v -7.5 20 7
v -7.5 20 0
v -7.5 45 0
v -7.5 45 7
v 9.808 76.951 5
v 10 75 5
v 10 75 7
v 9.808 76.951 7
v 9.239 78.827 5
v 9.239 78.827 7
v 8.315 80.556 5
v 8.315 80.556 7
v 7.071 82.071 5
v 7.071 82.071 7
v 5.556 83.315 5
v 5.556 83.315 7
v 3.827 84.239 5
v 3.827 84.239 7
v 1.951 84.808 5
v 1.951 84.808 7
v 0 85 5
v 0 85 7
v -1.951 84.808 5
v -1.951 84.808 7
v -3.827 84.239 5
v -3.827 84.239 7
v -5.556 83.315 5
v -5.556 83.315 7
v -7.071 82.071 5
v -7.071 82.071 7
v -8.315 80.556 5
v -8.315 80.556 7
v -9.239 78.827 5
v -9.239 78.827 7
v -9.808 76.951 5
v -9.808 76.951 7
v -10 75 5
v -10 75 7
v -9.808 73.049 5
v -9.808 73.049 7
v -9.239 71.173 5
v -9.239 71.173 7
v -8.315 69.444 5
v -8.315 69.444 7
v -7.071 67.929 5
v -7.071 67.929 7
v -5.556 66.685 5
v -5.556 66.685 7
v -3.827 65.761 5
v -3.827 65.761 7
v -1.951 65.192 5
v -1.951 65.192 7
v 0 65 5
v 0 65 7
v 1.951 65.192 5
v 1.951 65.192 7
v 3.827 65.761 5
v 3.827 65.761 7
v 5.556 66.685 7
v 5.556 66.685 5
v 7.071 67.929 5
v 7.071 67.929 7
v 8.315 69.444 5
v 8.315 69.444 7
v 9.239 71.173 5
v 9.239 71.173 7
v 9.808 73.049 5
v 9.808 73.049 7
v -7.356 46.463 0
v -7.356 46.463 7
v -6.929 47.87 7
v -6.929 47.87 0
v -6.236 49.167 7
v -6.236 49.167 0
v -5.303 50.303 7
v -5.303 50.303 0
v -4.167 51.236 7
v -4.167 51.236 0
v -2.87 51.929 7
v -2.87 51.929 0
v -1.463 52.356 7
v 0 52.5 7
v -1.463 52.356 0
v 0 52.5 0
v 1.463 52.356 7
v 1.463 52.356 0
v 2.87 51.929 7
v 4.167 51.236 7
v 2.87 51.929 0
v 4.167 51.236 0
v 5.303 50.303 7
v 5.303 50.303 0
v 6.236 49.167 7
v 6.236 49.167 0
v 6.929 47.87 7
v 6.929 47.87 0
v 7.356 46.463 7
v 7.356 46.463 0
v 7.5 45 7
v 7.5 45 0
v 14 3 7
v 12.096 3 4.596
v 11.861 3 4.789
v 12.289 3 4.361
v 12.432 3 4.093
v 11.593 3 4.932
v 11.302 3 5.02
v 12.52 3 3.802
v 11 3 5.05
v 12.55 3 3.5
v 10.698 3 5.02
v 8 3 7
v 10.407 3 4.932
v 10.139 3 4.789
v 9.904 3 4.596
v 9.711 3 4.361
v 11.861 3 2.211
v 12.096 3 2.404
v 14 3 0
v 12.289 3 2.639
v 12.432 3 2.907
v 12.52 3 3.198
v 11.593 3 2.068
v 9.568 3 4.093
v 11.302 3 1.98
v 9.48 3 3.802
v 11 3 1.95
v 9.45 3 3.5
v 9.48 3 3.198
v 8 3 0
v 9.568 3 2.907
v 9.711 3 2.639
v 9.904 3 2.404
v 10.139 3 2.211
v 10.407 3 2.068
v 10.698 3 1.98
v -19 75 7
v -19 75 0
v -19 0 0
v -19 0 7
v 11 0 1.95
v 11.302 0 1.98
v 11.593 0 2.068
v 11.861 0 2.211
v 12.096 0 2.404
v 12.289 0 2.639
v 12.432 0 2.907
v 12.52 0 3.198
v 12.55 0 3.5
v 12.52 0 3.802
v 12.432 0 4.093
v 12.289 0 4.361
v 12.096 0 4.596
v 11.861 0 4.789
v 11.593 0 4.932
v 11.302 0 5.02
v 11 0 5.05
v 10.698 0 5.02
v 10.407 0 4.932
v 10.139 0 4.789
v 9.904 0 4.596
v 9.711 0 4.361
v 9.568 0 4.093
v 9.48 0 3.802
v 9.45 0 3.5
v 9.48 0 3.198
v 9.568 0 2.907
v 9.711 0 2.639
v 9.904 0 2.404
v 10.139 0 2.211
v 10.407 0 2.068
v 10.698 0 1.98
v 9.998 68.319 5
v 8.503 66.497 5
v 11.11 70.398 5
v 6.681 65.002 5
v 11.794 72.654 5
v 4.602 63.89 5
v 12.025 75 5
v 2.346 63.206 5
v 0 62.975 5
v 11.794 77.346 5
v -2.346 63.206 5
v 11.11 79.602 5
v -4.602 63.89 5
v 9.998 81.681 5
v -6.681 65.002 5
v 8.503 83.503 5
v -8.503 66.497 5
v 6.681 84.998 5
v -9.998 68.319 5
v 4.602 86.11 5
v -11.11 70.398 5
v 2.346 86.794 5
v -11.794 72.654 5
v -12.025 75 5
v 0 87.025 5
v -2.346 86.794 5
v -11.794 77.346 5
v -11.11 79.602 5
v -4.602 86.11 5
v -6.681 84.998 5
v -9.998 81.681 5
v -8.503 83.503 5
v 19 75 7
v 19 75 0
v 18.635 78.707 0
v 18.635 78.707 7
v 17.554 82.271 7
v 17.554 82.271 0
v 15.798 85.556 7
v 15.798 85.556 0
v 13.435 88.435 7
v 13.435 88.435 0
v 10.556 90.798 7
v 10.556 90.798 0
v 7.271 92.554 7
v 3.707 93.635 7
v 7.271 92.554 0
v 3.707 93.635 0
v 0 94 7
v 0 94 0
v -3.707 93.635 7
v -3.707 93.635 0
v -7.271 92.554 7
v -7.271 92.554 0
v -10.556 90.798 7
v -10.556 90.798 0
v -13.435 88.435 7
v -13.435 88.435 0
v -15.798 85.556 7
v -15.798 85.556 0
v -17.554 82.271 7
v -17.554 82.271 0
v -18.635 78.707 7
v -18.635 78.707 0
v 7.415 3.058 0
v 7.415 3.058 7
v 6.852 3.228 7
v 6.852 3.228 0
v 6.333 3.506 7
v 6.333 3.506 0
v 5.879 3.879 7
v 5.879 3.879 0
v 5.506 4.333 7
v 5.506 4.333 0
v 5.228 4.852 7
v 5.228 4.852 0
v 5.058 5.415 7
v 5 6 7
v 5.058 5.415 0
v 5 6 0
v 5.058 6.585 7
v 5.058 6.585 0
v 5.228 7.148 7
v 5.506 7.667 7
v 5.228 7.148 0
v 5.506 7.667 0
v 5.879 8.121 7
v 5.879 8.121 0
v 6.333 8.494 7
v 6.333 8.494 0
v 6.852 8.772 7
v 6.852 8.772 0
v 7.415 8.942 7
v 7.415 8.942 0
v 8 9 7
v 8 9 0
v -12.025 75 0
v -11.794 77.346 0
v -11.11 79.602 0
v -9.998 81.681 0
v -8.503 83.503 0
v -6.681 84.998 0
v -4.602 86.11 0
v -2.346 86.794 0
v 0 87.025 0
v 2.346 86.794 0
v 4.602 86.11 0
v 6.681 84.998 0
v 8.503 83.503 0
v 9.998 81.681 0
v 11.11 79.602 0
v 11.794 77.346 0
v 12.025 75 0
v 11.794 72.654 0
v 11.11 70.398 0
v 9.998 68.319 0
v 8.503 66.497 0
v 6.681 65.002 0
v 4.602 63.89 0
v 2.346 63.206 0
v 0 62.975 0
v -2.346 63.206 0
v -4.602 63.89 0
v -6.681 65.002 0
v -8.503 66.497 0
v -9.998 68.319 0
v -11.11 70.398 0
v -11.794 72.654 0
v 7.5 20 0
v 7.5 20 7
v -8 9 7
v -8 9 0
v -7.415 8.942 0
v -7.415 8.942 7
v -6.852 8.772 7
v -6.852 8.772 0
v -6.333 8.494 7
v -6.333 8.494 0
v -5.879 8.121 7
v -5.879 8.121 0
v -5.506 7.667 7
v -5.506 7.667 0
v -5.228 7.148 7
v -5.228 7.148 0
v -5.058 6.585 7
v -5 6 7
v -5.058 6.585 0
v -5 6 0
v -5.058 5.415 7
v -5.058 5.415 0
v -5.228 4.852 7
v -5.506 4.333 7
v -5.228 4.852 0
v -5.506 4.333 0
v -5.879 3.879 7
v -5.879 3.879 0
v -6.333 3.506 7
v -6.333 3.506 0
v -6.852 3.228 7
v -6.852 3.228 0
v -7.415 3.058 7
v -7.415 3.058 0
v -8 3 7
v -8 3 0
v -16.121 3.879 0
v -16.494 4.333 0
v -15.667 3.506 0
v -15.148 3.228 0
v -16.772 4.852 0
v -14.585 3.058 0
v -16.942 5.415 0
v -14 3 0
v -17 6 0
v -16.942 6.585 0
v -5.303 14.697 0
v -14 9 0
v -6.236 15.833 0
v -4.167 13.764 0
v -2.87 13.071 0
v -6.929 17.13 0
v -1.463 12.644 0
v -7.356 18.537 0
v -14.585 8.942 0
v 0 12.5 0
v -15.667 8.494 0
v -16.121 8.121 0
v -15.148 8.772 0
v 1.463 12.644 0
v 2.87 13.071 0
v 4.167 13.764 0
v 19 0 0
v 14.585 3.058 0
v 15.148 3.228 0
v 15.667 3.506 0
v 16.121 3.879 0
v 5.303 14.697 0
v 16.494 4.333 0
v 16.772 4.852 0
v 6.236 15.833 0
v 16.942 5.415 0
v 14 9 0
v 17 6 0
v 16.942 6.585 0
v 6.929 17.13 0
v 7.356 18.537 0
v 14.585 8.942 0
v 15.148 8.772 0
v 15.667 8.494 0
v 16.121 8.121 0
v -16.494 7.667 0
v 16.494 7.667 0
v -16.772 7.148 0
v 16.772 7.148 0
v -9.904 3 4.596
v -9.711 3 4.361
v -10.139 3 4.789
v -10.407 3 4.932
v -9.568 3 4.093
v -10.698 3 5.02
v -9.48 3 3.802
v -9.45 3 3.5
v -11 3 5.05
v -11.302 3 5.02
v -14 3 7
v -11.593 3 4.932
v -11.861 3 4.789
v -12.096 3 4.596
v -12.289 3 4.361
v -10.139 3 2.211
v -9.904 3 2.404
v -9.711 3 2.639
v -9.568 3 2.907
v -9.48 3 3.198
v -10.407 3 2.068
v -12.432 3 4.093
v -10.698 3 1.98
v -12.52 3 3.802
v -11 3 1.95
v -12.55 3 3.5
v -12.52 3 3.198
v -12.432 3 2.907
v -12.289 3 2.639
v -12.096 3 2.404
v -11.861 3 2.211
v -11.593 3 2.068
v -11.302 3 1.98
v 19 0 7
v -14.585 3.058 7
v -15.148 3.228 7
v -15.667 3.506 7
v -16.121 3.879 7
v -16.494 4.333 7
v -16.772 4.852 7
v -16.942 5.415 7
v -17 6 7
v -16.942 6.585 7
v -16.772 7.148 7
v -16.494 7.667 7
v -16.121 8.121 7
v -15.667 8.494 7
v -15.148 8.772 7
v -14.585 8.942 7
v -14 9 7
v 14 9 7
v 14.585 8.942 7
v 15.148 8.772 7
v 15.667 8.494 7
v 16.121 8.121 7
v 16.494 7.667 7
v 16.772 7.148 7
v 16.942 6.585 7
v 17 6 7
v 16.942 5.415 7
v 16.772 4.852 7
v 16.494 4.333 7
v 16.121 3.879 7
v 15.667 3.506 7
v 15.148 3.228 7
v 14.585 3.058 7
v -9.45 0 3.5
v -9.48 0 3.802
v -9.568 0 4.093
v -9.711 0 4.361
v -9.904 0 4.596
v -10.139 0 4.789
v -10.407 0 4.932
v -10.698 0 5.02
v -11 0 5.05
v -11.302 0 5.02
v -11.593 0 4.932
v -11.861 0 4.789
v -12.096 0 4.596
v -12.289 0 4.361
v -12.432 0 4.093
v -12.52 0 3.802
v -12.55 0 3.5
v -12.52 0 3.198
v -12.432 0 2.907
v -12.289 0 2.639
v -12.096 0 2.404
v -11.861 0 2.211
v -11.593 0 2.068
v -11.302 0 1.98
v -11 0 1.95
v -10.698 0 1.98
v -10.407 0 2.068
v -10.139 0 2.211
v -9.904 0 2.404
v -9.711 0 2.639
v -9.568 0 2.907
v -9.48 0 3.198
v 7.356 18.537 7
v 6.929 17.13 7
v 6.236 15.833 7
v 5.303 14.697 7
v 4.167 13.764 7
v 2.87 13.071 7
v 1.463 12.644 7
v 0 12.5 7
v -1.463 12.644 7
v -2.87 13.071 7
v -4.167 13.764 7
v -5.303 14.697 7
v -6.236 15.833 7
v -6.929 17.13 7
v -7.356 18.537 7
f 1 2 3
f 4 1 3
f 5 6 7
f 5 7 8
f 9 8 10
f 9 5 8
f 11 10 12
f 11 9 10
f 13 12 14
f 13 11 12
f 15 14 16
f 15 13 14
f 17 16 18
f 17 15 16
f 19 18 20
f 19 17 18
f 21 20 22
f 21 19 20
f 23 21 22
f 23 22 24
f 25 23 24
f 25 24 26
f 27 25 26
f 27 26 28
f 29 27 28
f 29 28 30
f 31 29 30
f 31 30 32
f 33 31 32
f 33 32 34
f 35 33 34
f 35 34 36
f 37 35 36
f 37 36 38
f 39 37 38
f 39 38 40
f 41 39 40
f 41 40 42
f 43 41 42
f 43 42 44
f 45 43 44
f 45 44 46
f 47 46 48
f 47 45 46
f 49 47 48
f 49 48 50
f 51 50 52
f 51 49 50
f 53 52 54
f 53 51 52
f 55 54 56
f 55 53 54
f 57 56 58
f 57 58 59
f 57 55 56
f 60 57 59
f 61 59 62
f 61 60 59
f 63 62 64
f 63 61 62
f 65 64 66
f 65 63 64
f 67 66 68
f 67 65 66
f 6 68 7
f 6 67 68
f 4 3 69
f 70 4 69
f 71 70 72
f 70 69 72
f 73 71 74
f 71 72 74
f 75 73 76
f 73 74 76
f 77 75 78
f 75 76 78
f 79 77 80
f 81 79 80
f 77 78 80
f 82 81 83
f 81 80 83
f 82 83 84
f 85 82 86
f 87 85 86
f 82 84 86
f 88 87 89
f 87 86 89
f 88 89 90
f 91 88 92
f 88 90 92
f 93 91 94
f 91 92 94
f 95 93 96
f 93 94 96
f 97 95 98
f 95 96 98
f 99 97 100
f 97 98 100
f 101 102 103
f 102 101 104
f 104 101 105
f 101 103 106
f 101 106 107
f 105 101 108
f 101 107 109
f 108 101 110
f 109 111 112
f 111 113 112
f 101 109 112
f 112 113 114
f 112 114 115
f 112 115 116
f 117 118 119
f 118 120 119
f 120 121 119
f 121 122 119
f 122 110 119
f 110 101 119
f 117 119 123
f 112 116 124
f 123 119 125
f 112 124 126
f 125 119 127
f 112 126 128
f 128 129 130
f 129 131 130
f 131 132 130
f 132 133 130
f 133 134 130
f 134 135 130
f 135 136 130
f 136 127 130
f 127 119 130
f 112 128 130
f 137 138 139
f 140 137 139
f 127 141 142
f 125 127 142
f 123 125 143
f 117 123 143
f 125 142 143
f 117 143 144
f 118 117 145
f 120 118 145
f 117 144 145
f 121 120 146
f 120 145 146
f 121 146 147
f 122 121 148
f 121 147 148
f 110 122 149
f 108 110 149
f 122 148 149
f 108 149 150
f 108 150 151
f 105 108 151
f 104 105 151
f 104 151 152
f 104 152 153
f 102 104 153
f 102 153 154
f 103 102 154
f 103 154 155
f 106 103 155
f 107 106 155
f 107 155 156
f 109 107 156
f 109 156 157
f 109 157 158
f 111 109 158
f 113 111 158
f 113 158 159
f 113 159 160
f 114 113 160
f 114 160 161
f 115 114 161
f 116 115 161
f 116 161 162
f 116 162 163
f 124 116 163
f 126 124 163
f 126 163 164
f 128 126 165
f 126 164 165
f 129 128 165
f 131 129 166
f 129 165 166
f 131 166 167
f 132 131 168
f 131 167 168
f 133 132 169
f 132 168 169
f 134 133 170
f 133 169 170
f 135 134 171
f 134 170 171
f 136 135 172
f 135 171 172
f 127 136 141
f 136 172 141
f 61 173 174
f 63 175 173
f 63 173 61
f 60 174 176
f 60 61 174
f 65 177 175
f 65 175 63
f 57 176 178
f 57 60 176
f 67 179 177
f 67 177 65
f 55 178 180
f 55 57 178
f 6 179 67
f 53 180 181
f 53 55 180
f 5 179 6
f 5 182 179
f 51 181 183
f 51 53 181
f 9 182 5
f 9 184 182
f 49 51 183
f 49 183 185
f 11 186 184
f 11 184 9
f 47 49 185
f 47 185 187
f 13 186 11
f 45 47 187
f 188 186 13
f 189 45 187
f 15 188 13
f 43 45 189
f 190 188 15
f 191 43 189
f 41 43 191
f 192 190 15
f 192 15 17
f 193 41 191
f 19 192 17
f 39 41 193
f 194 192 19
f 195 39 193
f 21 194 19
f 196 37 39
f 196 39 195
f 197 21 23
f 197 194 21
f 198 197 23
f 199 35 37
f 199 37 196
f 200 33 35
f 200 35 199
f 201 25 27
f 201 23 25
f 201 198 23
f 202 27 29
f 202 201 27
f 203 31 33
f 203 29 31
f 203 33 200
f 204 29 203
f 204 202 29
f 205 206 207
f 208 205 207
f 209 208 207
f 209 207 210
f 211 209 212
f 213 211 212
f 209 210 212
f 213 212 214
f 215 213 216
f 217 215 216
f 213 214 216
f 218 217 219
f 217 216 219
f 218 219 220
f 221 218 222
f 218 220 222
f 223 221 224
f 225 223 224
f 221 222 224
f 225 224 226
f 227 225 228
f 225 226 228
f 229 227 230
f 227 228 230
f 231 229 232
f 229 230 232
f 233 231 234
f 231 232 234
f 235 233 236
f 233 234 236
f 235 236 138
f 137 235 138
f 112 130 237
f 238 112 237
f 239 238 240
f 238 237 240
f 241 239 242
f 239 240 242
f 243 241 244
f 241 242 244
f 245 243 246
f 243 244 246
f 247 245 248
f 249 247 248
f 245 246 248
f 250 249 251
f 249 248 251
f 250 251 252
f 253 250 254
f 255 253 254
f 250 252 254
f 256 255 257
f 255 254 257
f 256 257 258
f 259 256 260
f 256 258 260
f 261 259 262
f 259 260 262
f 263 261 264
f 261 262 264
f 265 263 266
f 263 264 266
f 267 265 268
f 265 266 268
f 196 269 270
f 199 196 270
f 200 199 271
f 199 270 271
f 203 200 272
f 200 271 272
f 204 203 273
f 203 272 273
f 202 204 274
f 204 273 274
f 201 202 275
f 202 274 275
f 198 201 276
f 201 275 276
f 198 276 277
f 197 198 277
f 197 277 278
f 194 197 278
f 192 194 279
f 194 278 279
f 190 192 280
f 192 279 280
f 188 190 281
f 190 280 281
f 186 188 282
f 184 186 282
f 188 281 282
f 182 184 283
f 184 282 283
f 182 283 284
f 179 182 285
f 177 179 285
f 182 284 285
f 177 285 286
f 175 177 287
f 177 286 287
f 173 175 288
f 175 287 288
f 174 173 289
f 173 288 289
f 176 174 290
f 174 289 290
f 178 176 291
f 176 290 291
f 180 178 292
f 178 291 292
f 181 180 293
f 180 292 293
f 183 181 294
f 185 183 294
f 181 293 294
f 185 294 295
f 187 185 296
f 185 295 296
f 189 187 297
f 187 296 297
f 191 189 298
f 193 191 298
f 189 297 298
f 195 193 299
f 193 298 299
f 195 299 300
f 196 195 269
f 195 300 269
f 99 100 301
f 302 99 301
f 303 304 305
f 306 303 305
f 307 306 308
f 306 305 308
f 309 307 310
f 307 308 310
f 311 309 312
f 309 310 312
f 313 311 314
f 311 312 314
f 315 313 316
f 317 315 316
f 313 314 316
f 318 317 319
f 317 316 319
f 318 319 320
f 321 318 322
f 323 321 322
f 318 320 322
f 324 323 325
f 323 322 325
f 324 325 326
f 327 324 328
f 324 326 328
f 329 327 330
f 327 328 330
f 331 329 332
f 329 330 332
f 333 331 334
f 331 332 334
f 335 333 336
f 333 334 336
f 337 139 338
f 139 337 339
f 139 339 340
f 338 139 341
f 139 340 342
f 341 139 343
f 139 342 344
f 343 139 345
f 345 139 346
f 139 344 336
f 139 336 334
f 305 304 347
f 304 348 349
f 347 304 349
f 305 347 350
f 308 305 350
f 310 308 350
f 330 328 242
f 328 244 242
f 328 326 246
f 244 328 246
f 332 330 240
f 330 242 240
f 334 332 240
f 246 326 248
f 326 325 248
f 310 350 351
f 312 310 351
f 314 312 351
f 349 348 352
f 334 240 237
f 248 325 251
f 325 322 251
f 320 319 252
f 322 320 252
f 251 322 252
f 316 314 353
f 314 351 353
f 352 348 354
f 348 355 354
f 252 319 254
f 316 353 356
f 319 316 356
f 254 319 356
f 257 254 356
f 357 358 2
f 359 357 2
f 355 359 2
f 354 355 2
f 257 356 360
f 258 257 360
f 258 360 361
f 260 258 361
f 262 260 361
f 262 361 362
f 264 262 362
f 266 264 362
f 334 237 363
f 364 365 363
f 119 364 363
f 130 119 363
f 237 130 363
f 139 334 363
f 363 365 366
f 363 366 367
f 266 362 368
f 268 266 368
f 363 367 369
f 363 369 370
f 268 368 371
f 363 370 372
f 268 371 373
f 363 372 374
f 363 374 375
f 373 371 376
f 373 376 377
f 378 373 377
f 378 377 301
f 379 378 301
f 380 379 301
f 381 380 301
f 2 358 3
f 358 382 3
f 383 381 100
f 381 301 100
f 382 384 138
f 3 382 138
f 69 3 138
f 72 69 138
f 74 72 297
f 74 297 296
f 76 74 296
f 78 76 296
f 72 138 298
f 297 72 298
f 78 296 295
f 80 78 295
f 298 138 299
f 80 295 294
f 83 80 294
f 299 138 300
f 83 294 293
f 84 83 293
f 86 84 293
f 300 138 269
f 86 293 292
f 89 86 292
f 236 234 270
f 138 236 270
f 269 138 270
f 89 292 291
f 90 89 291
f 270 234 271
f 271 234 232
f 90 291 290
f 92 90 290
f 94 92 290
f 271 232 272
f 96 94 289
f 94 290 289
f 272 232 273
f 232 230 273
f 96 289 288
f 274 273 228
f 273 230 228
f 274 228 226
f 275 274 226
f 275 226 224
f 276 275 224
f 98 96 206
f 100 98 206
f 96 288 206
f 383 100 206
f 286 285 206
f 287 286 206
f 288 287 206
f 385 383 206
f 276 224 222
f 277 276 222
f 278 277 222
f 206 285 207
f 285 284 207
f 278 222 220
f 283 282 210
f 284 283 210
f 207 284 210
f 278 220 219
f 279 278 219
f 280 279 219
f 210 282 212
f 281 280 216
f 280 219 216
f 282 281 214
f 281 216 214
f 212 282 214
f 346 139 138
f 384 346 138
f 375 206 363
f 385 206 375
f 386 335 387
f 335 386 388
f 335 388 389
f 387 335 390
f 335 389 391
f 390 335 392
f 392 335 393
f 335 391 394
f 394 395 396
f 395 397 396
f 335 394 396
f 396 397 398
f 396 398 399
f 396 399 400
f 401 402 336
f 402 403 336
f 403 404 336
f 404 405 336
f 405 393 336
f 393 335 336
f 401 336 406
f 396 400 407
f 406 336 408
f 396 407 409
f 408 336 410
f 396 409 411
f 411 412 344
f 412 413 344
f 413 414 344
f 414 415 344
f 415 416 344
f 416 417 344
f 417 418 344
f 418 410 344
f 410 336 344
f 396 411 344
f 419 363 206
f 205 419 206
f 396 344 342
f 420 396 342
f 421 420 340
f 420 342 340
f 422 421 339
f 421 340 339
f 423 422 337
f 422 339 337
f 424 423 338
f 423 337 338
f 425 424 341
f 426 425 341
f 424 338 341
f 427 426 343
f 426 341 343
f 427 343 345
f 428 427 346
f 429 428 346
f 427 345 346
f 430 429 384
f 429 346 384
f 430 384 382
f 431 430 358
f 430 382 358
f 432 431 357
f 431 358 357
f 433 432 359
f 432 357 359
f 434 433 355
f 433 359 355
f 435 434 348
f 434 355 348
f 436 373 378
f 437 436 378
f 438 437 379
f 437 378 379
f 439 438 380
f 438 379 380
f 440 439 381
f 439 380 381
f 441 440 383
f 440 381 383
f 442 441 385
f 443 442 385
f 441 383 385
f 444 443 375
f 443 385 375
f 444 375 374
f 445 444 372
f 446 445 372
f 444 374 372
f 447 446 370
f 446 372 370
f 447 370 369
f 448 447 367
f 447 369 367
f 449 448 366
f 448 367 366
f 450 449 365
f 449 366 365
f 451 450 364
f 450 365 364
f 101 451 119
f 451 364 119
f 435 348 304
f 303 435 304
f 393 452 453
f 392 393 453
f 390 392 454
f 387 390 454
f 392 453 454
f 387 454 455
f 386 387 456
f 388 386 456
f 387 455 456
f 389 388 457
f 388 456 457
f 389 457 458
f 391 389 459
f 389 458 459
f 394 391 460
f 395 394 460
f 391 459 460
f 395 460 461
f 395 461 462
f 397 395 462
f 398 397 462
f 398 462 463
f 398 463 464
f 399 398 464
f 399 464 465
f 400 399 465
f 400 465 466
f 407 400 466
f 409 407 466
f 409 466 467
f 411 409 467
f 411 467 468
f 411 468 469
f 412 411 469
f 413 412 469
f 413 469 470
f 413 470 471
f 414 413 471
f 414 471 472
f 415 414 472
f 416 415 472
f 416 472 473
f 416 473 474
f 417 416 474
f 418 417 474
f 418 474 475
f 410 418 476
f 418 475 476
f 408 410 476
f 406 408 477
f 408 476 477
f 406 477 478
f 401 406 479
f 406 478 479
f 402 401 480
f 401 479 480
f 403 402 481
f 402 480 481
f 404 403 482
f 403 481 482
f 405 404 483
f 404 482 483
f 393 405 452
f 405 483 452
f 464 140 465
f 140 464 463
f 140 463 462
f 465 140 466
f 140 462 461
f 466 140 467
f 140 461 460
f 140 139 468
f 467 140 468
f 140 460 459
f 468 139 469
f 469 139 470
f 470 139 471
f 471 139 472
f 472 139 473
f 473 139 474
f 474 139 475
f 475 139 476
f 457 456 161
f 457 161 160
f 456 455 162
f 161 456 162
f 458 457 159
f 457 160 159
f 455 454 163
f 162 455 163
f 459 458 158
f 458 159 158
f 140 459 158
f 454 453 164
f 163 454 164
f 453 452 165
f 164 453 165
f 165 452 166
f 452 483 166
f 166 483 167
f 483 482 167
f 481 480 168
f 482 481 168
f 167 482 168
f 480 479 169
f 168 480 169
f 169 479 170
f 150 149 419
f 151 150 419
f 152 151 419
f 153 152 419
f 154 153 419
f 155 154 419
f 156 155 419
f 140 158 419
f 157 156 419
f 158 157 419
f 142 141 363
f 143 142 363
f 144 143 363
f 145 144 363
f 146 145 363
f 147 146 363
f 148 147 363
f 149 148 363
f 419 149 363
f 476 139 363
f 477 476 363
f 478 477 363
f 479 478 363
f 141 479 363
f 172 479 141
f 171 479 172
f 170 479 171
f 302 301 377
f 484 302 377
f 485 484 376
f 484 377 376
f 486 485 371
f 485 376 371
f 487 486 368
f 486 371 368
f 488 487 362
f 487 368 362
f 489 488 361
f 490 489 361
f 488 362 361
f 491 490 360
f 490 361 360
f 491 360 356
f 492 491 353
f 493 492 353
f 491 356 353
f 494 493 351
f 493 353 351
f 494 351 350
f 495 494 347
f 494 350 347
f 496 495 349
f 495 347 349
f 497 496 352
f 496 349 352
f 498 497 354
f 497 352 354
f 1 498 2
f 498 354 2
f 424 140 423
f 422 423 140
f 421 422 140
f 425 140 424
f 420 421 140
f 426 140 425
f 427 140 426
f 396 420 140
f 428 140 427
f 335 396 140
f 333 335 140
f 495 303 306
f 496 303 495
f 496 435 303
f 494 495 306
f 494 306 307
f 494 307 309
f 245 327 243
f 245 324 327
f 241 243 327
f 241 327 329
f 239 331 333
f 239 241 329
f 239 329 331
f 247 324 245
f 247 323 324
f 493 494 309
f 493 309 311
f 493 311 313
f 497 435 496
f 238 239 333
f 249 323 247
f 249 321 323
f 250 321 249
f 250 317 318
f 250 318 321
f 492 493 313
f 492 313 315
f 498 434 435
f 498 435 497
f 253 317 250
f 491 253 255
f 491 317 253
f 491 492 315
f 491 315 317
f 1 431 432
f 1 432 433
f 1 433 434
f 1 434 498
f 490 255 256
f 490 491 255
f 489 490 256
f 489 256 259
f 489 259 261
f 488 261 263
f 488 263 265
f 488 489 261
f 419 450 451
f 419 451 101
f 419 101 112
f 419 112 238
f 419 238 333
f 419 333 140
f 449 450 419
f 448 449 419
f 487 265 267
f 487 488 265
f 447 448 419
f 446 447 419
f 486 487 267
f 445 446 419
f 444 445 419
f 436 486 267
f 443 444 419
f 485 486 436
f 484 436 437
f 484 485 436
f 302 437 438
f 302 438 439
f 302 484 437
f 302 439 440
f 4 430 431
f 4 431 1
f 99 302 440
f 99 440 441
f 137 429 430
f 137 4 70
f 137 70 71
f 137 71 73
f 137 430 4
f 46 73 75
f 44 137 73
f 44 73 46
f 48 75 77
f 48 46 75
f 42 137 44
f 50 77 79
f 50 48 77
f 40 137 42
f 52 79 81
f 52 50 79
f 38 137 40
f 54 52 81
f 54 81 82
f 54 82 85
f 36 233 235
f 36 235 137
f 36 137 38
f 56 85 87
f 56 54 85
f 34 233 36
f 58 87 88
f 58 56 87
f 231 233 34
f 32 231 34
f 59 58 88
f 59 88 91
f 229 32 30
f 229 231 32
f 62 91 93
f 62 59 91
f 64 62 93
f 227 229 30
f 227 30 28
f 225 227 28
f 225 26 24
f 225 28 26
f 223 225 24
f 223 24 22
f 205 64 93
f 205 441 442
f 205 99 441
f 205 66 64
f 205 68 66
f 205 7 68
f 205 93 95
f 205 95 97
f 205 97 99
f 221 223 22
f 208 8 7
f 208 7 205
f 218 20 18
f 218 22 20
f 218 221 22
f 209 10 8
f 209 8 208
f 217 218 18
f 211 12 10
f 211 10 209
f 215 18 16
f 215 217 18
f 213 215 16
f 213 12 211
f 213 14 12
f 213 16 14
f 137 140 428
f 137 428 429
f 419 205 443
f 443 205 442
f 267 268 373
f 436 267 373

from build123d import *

# Parameters (mm, degrees)
SKETCH_1_R         = 10
SKETCH_1_R_2       = 19
EXTRUDE_1_DEPTH    = 7
SKETCH2_R          = 12.025
CUT_EXTRUDE2_DEPTH = 5
SKETCH3_R          = 1.55
CUT_EXTRUDE3_DEPTH = 5


with BuildPart() as part:
    # 草图1 → 凸台-拉伸1 (new body)
    # profile 1 of 3: a face of its own
    with BuildSketch(Plane.XY):
        with BuildLine():
            ThreePointArc((19, 75), (0, 94), (-19, 75))
            ThreePointArc((-19, 75), (0, 56), (19, 75))
        make_face()
        with Locations((0, 75)):
            Circle(SKETCH_1_R, mode=Mode.SUBTRACT)
    # profile 2 of 3: a face of its own
    with BuildSketch(Plane.XY):
        with BuildLine():
            Line((-19, 7), (-19, 0))
            Line((-19, 0), (19, 0))
            Line((19, 0), (19, 7))
            Line((19, 7), (19, 75))
            ThreePointArc((19, 75), (0, 56), (-19, 75))
            Line((-19, 75), (-19, 7))
        make_face()
        with BuildLine():
            ThreePointArc((-8, 9), (-5, 6), (-8, 3))
            Line((-8, 3), (-14, 3))
            ThreePointArc((-14, 3), (-17, 6), (-14, 9))
            Line((-14, 9), (-8, 9))
        make_face(mode=Mode.SUBTRACT)
        with BuildLine():
            Line((14, 3), (8, 3))
            ThreePointArc((8, 3), (5, 6), (8, 9))
            Line((8, 9), (14, 9))
            ThreePointArc((14, 9), (17, 6), (14, 3))
        make_face(mode=Mode.SUBTRACT)
        with BuildLine():
            ThreePointArc((-7.5, 45), (0, 52.5), (7.5, 45))
            Line((7.5, 45), (7.5, 20))
            ThreePointArc((7.5, 20), (0, 12.5), (-7.5, 20))
            Line((-7.5, 20), (-7.5, 45))
        make_face(mode=Mode.SUBTRACT)
    # profile 3 of 3: a face of its own
    with BuildSketch(Plane.XY):
        with Locations((0, 75)):
            Circle(SKETCH_1_R_2)
        with Locations((0, 75)):
            Circle(SKETCH_1_R, mode=Mode.SUBTRACT)
    extrude(amount=EXTRUDE_1_DEPTH)

    # Sketch2 → Cut-Extrude2 (cut)
    with BuildSketch(Plane(origin=(0, 0, 0), x_dir=(-1, 0, 0), z_dir=(0, 0, -1))):
        with Locations((0, 75)):
            Circle(SKETCH2_R)
    extrude(amount=-CUT_EXTRUDE2_DEPTH, mode=Mode.SUBTRACT)

    # Sketch3 → Cut-Extrude3 (cut)
    with BuildSketch(Plane.XZ):
        with Locations(Location((11, 3.5, 0), (0, 0, 270))):
            Circle(SKETCH3_R)
        with Locations((-11, 3.5)):
            Circle(SKETCH3_R)
    extrude(amount=-CUT_EXTRUDE3_DEPTH, mode=Mode.SUBTRACT)


solid = part.part
